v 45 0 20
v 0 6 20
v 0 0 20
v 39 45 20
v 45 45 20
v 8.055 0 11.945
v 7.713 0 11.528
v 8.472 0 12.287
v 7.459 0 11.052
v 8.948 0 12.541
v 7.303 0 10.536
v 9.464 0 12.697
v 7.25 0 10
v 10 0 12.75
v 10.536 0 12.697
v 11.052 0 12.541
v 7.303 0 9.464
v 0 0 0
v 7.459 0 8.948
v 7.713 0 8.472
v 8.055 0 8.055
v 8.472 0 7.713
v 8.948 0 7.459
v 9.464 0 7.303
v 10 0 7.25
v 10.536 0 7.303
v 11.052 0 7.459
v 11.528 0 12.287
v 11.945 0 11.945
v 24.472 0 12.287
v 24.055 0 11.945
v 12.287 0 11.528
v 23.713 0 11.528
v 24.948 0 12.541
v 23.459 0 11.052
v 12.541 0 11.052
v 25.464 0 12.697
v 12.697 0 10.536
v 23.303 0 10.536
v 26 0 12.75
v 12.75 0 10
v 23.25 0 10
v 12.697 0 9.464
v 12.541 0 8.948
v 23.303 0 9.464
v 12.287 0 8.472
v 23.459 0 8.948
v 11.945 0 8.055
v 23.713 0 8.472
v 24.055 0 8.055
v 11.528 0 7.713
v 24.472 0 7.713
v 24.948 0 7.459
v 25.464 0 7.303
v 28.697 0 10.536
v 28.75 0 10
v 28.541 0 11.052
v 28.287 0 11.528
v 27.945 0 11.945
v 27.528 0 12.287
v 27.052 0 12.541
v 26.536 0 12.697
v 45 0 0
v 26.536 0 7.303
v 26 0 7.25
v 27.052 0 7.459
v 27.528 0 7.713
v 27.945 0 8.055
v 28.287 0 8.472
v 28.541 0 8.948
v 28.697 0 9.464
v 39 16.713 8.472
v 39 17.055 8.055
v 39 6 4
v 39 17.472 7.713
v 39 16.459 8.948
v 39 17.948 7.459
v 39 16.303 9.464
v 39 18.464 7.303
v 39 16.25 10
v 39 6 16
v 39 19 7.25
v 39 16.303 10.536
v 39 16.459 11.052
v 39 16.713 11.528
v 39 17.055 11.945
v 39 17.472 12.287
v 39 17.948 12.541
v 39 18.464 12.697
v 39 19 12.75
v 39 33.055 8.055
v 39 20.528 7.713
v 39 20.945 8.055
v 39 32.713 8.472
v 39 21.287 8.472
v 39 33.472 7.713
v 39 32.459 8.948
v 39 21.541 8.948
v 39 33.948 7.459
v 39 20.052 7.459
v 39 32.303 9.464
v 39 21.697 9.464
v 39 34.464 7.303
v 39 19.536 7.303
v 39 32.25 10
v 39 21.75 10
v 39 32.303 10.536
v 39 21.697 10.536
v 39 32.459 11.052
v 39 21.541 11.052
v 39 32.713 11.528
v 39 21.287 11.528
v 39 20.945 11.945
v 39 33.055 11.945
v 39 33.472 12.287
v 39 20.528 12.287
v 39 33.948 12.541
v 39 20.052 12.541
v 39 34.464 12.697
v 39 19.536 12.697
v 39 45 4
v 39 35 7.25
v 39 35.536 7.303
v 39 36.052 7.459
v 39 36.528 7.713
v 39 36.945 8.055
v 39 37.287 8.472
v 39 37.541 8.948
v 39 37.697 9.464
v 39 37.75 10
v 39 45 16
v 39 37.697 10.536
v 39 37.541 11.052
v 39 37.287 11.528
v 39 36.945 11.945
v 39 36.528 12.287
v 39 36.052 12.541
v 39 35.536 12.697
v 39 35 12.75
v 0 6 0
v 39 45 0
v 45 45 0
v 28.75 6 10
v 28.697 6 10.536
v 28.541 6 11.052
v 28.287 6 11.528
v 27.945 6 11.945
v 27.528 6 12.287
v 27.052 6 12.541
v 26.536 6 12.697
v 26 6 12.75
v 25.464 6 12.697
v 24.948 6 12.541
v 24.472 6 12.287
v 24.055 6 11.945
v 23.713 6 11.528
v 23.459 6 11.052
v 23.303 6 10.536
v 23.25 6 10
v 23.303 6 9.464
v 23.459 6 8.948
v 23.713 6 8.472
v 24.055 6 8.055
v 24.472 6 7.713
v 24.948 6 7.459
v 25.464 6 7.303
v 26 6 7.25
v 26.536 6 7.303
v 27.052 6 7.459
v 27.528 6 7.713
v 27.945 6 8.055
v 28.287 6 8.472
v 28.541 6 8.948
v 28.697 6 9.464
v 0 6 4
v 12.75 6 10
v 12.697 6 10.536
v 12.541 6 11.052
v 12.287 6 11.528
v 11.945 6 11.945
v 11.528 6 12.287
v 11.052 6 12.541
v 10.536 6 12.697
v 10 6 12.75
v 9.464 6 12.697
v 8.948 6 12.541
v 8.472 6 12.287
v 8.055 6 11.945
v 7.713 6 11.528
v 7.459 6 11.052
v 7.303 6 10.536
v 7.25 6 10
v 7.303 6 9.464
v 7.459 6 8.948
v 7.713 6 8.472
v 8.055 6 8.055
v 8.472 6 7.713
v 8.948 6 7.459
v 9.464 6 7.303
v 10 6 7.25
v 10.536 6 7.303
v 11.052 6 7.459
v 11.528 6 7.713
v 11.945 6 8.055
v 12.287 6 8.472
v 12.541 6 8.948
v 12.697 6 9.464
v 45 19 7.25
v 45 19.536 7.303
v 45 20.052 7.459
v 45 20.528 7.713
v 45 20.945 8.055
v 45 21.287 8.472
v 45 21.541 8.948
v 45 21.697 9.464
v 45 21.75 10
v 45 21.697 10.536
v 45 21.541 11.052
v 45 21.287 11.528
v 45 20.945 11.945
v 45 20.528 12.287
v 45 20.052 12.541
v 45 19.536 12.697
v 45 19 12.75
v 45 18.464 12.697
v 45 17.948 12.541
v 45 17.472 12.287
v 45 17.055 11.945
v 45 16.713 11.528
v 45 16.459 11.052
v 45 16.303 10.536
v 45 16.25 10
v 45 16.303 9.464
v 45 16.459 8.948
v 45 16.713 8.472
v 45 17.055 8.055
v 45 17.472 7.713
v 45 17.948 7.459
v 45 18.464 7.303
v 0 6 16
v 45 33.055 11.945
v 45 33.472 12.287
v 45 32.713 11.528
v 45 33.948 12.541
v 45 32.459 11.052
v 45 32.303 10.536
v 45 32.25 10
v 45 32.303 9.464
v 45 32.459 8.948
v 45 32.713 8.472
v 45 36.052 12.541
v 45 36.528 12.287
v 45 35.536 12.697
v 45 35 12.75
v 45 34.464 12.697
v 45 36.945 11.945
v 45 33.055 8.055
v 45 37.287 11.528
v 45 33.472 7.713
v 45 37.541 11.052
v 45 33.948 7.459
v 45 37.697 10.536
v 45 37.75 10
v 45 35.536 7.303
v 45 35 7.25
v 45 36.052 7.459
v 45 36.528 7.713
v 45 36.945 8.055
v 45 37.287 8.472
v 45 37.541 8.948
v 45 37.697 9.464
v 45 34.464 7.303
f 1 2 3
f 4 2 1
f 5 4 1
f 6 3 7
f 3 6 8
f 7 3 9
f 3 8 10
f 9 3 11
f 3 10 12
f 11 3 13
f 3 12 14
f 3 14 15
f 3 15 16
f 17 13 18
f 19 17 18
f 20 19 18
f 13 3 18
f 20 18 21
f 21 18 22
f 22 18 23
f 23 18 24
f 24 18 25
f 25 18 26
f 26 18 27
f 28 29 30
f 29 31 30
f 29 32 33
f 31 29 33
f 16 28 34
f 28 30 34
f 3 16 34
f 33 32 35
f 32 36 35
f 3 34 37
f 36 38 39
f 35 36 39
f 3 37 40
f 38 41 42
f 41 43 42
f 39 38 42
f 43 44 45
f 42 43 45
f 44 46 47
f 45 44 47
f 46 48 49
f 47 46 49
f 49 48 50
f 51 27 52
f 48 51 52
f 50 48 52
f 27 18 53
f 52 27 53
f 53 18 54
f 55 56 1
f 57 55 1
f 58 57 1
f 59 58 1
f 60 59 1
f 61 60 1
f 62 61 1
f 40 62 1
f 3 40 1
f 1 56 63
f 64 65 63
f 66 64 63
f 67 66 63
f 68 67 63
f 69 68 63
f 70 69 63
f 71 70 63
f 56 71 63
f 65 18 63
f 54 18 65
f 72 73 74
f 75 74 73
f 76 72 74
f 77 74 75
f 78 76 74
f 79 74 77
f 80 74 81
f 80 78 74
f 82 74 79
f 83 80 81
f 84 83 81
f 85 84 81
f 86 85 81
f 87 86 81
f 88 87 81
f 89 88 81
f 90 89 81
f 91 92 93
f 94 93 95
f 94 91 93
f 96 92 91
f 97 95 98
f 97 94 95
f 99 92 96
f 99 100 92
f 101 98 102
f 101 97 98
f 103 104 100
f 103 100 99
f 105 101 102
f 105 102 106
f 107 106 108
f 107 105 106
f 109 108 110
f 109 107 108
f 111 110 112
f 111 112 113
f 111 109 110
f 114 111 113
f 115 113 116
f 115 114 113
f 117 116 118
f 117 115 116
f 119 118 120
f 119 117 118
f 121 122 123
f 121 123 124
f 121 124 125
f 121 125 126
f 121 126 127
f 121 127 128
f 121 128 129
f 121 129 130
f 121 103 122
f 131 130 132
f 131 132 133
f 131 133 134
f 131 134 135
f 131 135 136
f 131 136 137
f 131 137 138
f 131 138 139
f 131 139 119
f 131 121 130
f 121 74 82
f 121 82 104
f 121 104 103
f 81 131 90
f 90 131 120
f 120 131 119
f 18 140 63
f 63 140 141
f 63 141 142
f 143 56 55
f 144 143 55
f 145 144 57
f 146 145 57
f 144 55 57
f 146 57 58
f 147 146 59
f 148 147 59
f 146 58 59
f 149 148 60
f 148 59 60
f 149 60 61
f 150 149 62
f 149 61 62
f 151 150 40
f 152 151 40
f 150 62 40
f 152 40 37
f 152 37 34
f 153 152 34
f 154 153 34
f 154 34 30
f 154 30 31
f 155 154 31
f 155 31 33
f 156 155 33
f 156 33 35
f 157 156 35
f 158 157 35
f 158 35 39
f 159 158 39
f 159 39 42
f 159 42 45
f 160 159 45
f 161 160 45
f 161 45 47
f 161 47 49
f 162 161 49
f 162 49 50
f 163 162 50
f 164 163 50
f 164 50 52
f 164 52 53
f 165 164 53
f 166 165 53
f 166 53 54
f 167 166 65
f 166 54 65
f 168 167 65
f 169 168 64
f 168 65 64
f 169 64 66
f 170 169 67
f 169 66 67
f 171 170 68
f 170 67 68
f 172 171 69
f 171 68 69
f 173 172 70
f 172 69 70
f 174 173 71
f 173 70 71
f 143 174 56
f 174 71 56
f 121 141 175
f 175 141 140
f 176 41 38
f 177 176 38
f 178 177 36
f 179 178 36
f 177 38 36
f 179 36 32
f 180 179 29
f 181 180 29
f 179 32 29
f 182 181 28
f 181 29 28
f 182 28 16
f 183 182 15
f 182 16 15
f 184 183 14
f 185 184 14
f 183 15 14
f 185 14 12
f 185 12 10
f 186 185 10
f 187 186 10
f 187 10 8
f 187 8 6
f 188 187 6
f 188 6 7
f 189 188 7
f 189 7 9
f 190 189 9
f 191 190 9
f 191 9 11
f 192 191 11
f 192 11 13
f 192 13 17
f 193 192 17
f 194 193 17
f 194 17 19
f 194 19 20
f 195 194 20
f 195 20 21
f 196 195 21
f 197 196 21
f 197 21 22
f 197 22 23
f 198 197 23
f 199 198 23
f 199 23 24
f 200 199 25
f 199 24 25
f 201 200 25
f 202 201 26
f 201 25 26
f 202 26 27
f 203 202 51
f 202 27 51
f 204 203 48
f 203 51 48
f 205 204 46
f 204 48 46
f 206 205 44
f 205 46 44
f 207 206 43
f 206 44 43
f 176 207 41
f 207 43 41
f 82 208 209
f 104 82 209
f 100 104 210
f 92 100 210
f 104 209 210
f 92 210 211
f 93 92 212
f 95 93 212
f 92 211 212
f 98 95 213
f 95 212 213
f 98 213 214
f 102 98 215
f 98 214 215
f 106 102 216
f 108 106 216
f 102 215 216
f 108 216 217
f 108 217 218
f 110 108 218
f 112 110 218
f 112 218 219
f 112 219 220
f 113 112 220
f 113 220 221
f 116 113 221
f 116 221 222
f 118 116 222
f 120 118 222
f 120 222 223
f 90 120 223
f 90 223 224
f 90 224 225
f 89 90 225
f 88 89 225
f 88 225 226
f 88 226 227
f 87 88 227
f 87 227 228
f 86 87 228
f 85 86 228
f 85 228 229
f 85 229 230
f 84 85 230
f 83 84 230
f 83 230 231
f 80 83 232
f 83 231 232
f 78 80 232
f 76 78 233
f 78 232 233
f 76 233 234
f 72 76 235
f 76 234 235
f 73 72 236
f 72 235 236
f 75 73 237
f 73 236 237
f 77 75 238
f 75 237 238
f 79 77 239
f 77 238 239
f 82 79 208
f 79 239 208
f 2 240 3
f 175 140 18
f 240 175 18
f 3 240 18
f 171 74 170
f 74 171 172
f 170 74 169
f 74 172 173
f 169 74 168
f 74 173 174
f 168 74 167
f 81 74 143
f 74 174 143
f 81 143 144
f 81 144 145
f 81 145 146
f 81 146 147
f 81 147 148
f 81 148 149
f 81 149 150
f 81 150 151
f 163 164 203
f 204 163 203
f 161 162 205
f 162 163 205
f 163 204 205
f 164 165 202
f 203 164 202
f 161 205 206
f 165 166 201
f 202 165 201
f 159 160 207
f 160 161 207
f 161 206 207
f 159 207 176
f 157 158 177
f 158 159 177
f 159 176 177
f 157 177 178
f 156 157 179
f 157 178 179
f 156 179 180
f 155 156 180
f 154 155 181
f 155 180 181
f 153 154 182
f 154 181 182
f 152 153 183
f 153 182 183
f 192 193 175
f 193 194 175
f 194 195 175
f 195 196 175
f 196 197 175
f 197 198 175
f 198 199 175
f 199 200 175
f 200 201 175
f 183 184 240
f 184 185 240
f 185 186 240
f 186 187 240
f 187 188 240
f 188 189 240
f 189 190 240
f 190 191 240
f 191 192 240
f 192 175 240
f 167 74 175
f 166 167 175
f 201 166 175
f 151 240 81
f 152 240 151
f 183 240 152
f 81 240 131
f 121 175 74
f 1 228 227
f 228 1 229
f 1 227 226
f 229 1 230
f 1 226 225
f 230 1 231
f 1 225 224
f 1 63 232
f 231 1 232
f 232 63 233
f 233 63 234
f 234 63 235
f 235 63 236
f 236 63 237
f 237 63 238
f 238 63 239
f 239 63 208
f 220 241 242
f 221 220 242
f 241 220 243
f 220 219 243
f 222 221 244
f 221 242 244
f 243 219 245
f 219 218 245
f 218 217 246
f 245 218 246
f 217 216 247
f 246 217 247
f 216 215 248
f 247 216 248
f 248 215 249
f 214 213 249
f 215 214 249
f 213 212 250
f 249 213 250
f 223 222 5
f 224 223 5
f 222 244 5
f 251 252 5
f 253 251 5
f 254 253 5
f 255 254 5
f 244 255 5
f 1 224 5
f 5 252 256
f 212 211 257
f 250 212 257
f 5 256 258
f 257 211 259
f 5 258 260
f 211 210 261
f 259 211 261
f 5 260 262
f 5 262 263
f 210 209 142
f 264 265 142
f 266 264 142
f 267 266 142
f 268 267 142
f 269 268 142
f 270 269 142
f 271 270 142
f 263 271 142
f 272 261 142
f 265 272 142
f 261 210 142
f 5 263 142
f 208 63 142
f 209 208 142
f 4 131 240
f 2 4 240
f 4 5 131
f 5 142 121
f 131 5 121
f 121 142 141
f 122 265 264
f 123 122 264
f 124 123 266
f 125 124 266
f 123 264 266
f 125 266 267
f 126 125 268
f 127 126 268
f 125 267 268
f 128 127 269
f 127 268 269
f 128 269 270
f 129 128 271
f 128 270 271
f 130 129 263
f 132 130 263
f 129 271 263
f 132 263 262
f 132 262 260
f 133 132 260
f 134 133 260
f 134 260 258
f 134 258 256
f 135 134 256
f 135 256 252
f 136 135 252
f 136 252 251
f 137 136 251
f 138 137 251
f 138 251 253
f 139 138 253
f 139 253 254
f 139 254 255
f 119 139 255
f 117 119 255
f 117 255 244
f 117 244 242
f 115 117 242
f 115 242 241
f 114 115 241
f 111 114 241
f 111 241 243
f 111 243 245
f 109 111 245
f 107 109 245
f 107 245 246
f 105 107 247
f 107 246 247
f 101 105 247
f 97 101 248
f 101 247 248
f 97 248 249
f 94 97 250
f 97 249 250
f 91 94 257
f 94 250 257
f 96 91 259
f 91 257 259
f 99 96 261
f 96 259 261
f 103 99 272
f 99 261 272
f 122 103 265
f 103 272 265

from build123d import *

# Parameters (mm, degrees)
SALIENTE_EXTRUIR1_DEPTH = 20
CROQUIS2_W              = 12
CROQUIS2_H              = 39
CORTAR_EXTRUIR1_DEPTH   = 39
CORTAR_EXTRUIR2_REACH   = 47
CROQUIS3_R              = 2.75
CORTAR_EXTRUIR3_REACH   = 47
CROQUIS4_R              = 2.75


with BuildPart() as part:
    # Croquis1 → Saliente-Extruir1 (new body)
    with BuildSketch(Plane.XY):
        Polygon((0, 0), (45, 0), (45, 45), (39, 45), (0, 6), align=None)
    extrude(amount=SALIENTE_EXTRUIR1_DEPTH)

    # Croquis2 → Cortar-Extruir1 (cut)
    with BuildSketch(Plane.ZY):
        with Locations((10, 25.5)):
            Rectangle(CROQUIS2_W, CROQUIS2_H)
    extrude(amount=-CORTAR_EXTRUIR1_DEPTH, mode=Mode.SUBTRACT)

    # Croquis3 → Cortar-Extruir2 (cut, up to next)
    with BuildSketch(Plane(origin=(45, 0, 0), x_dir=(0, 0, -1), z_dir=(1, 0, 0)), mode=Mode.PRIVATE) as cortar_extruir2_sk1:
        with Locations((-10, 35)):
            Circle(CROQUIS3_R)
    cortar_extruir2_tool1 = extrude(cortar_extruir2_sk1.sketch, amount=-CORTAR_EXTRUIR2_REACH, mode=Mode.PRIVATE) & part.part
    add(cortar_extruir2_tool1.solids().sort_by_distance((45, 35, 10))[0], mode=Mode.SUBTRACT)
    # Croquis3 → Cortar-Extruir2 (cut, up to next)
    with BuildSketch(Plane(origin=(45, 0, 0), x_dir=(0, 0, -1), z_dir=(1, 0, 0)), mode=Mode.PRIVATE) as cortar_extruir2_sk2:
        with Locations((-10, 19)):
            Circle(CROQUIS3_R)
    cortar_extruir2_tool2 = extrude(cortar_extruir2_sk2.sketch, amount=-CORTAR_EXTRUIR2_REACH, mode=Mode.PRIVATE) & part.part
    add(cortar_extruir2_tool2.solids().sort_by_distance((45, 19, 10))[0], mode=Mode.SUBTRACT)

    # Croquis4 → Cortar-Extruir3 (cut, up to next)
    with BuildSketch(Plane.XZ, mode=Mode.PRIVATE) as cortar_extruir3_sk1:
        with Locations((10, 10)):
            Circle(CROQUIS4_R)
    cortar_extruir3_tool1 = extrude(cortar_extruir3_sk1.sketch, amount=-CORTAR_EXTRUIR3_REACH, mode=Mode.PRIVATE) & part.part
    add(cortar_extruir3_tool1.solids().sort_by_distance((10, 0, 10))[0], mode=Mode.SUBTRACT)
    # Croquis4 → Cortar-Extruir3 (cut, up to next)
    with BuildSketch(Plane.XZ, mode=Mode.PRIVATE) as cortar_extruir3_sk2:
        with Locations((26, 10)):
            Circle(CROQUIS4_R)
    cortar_extruir3_tool2 = extrude(cortar_extruir3_sk2.sketch, amount=-CORTAR_EXTRUIR3_REACH, mode=Mode.PRIVATE) & part.part
    add(cortar_extruir3_tool2.solids().sort_by_distance((26, 0, 10))[0], mode=Mode.SUBTRACT)


solid = part.part
